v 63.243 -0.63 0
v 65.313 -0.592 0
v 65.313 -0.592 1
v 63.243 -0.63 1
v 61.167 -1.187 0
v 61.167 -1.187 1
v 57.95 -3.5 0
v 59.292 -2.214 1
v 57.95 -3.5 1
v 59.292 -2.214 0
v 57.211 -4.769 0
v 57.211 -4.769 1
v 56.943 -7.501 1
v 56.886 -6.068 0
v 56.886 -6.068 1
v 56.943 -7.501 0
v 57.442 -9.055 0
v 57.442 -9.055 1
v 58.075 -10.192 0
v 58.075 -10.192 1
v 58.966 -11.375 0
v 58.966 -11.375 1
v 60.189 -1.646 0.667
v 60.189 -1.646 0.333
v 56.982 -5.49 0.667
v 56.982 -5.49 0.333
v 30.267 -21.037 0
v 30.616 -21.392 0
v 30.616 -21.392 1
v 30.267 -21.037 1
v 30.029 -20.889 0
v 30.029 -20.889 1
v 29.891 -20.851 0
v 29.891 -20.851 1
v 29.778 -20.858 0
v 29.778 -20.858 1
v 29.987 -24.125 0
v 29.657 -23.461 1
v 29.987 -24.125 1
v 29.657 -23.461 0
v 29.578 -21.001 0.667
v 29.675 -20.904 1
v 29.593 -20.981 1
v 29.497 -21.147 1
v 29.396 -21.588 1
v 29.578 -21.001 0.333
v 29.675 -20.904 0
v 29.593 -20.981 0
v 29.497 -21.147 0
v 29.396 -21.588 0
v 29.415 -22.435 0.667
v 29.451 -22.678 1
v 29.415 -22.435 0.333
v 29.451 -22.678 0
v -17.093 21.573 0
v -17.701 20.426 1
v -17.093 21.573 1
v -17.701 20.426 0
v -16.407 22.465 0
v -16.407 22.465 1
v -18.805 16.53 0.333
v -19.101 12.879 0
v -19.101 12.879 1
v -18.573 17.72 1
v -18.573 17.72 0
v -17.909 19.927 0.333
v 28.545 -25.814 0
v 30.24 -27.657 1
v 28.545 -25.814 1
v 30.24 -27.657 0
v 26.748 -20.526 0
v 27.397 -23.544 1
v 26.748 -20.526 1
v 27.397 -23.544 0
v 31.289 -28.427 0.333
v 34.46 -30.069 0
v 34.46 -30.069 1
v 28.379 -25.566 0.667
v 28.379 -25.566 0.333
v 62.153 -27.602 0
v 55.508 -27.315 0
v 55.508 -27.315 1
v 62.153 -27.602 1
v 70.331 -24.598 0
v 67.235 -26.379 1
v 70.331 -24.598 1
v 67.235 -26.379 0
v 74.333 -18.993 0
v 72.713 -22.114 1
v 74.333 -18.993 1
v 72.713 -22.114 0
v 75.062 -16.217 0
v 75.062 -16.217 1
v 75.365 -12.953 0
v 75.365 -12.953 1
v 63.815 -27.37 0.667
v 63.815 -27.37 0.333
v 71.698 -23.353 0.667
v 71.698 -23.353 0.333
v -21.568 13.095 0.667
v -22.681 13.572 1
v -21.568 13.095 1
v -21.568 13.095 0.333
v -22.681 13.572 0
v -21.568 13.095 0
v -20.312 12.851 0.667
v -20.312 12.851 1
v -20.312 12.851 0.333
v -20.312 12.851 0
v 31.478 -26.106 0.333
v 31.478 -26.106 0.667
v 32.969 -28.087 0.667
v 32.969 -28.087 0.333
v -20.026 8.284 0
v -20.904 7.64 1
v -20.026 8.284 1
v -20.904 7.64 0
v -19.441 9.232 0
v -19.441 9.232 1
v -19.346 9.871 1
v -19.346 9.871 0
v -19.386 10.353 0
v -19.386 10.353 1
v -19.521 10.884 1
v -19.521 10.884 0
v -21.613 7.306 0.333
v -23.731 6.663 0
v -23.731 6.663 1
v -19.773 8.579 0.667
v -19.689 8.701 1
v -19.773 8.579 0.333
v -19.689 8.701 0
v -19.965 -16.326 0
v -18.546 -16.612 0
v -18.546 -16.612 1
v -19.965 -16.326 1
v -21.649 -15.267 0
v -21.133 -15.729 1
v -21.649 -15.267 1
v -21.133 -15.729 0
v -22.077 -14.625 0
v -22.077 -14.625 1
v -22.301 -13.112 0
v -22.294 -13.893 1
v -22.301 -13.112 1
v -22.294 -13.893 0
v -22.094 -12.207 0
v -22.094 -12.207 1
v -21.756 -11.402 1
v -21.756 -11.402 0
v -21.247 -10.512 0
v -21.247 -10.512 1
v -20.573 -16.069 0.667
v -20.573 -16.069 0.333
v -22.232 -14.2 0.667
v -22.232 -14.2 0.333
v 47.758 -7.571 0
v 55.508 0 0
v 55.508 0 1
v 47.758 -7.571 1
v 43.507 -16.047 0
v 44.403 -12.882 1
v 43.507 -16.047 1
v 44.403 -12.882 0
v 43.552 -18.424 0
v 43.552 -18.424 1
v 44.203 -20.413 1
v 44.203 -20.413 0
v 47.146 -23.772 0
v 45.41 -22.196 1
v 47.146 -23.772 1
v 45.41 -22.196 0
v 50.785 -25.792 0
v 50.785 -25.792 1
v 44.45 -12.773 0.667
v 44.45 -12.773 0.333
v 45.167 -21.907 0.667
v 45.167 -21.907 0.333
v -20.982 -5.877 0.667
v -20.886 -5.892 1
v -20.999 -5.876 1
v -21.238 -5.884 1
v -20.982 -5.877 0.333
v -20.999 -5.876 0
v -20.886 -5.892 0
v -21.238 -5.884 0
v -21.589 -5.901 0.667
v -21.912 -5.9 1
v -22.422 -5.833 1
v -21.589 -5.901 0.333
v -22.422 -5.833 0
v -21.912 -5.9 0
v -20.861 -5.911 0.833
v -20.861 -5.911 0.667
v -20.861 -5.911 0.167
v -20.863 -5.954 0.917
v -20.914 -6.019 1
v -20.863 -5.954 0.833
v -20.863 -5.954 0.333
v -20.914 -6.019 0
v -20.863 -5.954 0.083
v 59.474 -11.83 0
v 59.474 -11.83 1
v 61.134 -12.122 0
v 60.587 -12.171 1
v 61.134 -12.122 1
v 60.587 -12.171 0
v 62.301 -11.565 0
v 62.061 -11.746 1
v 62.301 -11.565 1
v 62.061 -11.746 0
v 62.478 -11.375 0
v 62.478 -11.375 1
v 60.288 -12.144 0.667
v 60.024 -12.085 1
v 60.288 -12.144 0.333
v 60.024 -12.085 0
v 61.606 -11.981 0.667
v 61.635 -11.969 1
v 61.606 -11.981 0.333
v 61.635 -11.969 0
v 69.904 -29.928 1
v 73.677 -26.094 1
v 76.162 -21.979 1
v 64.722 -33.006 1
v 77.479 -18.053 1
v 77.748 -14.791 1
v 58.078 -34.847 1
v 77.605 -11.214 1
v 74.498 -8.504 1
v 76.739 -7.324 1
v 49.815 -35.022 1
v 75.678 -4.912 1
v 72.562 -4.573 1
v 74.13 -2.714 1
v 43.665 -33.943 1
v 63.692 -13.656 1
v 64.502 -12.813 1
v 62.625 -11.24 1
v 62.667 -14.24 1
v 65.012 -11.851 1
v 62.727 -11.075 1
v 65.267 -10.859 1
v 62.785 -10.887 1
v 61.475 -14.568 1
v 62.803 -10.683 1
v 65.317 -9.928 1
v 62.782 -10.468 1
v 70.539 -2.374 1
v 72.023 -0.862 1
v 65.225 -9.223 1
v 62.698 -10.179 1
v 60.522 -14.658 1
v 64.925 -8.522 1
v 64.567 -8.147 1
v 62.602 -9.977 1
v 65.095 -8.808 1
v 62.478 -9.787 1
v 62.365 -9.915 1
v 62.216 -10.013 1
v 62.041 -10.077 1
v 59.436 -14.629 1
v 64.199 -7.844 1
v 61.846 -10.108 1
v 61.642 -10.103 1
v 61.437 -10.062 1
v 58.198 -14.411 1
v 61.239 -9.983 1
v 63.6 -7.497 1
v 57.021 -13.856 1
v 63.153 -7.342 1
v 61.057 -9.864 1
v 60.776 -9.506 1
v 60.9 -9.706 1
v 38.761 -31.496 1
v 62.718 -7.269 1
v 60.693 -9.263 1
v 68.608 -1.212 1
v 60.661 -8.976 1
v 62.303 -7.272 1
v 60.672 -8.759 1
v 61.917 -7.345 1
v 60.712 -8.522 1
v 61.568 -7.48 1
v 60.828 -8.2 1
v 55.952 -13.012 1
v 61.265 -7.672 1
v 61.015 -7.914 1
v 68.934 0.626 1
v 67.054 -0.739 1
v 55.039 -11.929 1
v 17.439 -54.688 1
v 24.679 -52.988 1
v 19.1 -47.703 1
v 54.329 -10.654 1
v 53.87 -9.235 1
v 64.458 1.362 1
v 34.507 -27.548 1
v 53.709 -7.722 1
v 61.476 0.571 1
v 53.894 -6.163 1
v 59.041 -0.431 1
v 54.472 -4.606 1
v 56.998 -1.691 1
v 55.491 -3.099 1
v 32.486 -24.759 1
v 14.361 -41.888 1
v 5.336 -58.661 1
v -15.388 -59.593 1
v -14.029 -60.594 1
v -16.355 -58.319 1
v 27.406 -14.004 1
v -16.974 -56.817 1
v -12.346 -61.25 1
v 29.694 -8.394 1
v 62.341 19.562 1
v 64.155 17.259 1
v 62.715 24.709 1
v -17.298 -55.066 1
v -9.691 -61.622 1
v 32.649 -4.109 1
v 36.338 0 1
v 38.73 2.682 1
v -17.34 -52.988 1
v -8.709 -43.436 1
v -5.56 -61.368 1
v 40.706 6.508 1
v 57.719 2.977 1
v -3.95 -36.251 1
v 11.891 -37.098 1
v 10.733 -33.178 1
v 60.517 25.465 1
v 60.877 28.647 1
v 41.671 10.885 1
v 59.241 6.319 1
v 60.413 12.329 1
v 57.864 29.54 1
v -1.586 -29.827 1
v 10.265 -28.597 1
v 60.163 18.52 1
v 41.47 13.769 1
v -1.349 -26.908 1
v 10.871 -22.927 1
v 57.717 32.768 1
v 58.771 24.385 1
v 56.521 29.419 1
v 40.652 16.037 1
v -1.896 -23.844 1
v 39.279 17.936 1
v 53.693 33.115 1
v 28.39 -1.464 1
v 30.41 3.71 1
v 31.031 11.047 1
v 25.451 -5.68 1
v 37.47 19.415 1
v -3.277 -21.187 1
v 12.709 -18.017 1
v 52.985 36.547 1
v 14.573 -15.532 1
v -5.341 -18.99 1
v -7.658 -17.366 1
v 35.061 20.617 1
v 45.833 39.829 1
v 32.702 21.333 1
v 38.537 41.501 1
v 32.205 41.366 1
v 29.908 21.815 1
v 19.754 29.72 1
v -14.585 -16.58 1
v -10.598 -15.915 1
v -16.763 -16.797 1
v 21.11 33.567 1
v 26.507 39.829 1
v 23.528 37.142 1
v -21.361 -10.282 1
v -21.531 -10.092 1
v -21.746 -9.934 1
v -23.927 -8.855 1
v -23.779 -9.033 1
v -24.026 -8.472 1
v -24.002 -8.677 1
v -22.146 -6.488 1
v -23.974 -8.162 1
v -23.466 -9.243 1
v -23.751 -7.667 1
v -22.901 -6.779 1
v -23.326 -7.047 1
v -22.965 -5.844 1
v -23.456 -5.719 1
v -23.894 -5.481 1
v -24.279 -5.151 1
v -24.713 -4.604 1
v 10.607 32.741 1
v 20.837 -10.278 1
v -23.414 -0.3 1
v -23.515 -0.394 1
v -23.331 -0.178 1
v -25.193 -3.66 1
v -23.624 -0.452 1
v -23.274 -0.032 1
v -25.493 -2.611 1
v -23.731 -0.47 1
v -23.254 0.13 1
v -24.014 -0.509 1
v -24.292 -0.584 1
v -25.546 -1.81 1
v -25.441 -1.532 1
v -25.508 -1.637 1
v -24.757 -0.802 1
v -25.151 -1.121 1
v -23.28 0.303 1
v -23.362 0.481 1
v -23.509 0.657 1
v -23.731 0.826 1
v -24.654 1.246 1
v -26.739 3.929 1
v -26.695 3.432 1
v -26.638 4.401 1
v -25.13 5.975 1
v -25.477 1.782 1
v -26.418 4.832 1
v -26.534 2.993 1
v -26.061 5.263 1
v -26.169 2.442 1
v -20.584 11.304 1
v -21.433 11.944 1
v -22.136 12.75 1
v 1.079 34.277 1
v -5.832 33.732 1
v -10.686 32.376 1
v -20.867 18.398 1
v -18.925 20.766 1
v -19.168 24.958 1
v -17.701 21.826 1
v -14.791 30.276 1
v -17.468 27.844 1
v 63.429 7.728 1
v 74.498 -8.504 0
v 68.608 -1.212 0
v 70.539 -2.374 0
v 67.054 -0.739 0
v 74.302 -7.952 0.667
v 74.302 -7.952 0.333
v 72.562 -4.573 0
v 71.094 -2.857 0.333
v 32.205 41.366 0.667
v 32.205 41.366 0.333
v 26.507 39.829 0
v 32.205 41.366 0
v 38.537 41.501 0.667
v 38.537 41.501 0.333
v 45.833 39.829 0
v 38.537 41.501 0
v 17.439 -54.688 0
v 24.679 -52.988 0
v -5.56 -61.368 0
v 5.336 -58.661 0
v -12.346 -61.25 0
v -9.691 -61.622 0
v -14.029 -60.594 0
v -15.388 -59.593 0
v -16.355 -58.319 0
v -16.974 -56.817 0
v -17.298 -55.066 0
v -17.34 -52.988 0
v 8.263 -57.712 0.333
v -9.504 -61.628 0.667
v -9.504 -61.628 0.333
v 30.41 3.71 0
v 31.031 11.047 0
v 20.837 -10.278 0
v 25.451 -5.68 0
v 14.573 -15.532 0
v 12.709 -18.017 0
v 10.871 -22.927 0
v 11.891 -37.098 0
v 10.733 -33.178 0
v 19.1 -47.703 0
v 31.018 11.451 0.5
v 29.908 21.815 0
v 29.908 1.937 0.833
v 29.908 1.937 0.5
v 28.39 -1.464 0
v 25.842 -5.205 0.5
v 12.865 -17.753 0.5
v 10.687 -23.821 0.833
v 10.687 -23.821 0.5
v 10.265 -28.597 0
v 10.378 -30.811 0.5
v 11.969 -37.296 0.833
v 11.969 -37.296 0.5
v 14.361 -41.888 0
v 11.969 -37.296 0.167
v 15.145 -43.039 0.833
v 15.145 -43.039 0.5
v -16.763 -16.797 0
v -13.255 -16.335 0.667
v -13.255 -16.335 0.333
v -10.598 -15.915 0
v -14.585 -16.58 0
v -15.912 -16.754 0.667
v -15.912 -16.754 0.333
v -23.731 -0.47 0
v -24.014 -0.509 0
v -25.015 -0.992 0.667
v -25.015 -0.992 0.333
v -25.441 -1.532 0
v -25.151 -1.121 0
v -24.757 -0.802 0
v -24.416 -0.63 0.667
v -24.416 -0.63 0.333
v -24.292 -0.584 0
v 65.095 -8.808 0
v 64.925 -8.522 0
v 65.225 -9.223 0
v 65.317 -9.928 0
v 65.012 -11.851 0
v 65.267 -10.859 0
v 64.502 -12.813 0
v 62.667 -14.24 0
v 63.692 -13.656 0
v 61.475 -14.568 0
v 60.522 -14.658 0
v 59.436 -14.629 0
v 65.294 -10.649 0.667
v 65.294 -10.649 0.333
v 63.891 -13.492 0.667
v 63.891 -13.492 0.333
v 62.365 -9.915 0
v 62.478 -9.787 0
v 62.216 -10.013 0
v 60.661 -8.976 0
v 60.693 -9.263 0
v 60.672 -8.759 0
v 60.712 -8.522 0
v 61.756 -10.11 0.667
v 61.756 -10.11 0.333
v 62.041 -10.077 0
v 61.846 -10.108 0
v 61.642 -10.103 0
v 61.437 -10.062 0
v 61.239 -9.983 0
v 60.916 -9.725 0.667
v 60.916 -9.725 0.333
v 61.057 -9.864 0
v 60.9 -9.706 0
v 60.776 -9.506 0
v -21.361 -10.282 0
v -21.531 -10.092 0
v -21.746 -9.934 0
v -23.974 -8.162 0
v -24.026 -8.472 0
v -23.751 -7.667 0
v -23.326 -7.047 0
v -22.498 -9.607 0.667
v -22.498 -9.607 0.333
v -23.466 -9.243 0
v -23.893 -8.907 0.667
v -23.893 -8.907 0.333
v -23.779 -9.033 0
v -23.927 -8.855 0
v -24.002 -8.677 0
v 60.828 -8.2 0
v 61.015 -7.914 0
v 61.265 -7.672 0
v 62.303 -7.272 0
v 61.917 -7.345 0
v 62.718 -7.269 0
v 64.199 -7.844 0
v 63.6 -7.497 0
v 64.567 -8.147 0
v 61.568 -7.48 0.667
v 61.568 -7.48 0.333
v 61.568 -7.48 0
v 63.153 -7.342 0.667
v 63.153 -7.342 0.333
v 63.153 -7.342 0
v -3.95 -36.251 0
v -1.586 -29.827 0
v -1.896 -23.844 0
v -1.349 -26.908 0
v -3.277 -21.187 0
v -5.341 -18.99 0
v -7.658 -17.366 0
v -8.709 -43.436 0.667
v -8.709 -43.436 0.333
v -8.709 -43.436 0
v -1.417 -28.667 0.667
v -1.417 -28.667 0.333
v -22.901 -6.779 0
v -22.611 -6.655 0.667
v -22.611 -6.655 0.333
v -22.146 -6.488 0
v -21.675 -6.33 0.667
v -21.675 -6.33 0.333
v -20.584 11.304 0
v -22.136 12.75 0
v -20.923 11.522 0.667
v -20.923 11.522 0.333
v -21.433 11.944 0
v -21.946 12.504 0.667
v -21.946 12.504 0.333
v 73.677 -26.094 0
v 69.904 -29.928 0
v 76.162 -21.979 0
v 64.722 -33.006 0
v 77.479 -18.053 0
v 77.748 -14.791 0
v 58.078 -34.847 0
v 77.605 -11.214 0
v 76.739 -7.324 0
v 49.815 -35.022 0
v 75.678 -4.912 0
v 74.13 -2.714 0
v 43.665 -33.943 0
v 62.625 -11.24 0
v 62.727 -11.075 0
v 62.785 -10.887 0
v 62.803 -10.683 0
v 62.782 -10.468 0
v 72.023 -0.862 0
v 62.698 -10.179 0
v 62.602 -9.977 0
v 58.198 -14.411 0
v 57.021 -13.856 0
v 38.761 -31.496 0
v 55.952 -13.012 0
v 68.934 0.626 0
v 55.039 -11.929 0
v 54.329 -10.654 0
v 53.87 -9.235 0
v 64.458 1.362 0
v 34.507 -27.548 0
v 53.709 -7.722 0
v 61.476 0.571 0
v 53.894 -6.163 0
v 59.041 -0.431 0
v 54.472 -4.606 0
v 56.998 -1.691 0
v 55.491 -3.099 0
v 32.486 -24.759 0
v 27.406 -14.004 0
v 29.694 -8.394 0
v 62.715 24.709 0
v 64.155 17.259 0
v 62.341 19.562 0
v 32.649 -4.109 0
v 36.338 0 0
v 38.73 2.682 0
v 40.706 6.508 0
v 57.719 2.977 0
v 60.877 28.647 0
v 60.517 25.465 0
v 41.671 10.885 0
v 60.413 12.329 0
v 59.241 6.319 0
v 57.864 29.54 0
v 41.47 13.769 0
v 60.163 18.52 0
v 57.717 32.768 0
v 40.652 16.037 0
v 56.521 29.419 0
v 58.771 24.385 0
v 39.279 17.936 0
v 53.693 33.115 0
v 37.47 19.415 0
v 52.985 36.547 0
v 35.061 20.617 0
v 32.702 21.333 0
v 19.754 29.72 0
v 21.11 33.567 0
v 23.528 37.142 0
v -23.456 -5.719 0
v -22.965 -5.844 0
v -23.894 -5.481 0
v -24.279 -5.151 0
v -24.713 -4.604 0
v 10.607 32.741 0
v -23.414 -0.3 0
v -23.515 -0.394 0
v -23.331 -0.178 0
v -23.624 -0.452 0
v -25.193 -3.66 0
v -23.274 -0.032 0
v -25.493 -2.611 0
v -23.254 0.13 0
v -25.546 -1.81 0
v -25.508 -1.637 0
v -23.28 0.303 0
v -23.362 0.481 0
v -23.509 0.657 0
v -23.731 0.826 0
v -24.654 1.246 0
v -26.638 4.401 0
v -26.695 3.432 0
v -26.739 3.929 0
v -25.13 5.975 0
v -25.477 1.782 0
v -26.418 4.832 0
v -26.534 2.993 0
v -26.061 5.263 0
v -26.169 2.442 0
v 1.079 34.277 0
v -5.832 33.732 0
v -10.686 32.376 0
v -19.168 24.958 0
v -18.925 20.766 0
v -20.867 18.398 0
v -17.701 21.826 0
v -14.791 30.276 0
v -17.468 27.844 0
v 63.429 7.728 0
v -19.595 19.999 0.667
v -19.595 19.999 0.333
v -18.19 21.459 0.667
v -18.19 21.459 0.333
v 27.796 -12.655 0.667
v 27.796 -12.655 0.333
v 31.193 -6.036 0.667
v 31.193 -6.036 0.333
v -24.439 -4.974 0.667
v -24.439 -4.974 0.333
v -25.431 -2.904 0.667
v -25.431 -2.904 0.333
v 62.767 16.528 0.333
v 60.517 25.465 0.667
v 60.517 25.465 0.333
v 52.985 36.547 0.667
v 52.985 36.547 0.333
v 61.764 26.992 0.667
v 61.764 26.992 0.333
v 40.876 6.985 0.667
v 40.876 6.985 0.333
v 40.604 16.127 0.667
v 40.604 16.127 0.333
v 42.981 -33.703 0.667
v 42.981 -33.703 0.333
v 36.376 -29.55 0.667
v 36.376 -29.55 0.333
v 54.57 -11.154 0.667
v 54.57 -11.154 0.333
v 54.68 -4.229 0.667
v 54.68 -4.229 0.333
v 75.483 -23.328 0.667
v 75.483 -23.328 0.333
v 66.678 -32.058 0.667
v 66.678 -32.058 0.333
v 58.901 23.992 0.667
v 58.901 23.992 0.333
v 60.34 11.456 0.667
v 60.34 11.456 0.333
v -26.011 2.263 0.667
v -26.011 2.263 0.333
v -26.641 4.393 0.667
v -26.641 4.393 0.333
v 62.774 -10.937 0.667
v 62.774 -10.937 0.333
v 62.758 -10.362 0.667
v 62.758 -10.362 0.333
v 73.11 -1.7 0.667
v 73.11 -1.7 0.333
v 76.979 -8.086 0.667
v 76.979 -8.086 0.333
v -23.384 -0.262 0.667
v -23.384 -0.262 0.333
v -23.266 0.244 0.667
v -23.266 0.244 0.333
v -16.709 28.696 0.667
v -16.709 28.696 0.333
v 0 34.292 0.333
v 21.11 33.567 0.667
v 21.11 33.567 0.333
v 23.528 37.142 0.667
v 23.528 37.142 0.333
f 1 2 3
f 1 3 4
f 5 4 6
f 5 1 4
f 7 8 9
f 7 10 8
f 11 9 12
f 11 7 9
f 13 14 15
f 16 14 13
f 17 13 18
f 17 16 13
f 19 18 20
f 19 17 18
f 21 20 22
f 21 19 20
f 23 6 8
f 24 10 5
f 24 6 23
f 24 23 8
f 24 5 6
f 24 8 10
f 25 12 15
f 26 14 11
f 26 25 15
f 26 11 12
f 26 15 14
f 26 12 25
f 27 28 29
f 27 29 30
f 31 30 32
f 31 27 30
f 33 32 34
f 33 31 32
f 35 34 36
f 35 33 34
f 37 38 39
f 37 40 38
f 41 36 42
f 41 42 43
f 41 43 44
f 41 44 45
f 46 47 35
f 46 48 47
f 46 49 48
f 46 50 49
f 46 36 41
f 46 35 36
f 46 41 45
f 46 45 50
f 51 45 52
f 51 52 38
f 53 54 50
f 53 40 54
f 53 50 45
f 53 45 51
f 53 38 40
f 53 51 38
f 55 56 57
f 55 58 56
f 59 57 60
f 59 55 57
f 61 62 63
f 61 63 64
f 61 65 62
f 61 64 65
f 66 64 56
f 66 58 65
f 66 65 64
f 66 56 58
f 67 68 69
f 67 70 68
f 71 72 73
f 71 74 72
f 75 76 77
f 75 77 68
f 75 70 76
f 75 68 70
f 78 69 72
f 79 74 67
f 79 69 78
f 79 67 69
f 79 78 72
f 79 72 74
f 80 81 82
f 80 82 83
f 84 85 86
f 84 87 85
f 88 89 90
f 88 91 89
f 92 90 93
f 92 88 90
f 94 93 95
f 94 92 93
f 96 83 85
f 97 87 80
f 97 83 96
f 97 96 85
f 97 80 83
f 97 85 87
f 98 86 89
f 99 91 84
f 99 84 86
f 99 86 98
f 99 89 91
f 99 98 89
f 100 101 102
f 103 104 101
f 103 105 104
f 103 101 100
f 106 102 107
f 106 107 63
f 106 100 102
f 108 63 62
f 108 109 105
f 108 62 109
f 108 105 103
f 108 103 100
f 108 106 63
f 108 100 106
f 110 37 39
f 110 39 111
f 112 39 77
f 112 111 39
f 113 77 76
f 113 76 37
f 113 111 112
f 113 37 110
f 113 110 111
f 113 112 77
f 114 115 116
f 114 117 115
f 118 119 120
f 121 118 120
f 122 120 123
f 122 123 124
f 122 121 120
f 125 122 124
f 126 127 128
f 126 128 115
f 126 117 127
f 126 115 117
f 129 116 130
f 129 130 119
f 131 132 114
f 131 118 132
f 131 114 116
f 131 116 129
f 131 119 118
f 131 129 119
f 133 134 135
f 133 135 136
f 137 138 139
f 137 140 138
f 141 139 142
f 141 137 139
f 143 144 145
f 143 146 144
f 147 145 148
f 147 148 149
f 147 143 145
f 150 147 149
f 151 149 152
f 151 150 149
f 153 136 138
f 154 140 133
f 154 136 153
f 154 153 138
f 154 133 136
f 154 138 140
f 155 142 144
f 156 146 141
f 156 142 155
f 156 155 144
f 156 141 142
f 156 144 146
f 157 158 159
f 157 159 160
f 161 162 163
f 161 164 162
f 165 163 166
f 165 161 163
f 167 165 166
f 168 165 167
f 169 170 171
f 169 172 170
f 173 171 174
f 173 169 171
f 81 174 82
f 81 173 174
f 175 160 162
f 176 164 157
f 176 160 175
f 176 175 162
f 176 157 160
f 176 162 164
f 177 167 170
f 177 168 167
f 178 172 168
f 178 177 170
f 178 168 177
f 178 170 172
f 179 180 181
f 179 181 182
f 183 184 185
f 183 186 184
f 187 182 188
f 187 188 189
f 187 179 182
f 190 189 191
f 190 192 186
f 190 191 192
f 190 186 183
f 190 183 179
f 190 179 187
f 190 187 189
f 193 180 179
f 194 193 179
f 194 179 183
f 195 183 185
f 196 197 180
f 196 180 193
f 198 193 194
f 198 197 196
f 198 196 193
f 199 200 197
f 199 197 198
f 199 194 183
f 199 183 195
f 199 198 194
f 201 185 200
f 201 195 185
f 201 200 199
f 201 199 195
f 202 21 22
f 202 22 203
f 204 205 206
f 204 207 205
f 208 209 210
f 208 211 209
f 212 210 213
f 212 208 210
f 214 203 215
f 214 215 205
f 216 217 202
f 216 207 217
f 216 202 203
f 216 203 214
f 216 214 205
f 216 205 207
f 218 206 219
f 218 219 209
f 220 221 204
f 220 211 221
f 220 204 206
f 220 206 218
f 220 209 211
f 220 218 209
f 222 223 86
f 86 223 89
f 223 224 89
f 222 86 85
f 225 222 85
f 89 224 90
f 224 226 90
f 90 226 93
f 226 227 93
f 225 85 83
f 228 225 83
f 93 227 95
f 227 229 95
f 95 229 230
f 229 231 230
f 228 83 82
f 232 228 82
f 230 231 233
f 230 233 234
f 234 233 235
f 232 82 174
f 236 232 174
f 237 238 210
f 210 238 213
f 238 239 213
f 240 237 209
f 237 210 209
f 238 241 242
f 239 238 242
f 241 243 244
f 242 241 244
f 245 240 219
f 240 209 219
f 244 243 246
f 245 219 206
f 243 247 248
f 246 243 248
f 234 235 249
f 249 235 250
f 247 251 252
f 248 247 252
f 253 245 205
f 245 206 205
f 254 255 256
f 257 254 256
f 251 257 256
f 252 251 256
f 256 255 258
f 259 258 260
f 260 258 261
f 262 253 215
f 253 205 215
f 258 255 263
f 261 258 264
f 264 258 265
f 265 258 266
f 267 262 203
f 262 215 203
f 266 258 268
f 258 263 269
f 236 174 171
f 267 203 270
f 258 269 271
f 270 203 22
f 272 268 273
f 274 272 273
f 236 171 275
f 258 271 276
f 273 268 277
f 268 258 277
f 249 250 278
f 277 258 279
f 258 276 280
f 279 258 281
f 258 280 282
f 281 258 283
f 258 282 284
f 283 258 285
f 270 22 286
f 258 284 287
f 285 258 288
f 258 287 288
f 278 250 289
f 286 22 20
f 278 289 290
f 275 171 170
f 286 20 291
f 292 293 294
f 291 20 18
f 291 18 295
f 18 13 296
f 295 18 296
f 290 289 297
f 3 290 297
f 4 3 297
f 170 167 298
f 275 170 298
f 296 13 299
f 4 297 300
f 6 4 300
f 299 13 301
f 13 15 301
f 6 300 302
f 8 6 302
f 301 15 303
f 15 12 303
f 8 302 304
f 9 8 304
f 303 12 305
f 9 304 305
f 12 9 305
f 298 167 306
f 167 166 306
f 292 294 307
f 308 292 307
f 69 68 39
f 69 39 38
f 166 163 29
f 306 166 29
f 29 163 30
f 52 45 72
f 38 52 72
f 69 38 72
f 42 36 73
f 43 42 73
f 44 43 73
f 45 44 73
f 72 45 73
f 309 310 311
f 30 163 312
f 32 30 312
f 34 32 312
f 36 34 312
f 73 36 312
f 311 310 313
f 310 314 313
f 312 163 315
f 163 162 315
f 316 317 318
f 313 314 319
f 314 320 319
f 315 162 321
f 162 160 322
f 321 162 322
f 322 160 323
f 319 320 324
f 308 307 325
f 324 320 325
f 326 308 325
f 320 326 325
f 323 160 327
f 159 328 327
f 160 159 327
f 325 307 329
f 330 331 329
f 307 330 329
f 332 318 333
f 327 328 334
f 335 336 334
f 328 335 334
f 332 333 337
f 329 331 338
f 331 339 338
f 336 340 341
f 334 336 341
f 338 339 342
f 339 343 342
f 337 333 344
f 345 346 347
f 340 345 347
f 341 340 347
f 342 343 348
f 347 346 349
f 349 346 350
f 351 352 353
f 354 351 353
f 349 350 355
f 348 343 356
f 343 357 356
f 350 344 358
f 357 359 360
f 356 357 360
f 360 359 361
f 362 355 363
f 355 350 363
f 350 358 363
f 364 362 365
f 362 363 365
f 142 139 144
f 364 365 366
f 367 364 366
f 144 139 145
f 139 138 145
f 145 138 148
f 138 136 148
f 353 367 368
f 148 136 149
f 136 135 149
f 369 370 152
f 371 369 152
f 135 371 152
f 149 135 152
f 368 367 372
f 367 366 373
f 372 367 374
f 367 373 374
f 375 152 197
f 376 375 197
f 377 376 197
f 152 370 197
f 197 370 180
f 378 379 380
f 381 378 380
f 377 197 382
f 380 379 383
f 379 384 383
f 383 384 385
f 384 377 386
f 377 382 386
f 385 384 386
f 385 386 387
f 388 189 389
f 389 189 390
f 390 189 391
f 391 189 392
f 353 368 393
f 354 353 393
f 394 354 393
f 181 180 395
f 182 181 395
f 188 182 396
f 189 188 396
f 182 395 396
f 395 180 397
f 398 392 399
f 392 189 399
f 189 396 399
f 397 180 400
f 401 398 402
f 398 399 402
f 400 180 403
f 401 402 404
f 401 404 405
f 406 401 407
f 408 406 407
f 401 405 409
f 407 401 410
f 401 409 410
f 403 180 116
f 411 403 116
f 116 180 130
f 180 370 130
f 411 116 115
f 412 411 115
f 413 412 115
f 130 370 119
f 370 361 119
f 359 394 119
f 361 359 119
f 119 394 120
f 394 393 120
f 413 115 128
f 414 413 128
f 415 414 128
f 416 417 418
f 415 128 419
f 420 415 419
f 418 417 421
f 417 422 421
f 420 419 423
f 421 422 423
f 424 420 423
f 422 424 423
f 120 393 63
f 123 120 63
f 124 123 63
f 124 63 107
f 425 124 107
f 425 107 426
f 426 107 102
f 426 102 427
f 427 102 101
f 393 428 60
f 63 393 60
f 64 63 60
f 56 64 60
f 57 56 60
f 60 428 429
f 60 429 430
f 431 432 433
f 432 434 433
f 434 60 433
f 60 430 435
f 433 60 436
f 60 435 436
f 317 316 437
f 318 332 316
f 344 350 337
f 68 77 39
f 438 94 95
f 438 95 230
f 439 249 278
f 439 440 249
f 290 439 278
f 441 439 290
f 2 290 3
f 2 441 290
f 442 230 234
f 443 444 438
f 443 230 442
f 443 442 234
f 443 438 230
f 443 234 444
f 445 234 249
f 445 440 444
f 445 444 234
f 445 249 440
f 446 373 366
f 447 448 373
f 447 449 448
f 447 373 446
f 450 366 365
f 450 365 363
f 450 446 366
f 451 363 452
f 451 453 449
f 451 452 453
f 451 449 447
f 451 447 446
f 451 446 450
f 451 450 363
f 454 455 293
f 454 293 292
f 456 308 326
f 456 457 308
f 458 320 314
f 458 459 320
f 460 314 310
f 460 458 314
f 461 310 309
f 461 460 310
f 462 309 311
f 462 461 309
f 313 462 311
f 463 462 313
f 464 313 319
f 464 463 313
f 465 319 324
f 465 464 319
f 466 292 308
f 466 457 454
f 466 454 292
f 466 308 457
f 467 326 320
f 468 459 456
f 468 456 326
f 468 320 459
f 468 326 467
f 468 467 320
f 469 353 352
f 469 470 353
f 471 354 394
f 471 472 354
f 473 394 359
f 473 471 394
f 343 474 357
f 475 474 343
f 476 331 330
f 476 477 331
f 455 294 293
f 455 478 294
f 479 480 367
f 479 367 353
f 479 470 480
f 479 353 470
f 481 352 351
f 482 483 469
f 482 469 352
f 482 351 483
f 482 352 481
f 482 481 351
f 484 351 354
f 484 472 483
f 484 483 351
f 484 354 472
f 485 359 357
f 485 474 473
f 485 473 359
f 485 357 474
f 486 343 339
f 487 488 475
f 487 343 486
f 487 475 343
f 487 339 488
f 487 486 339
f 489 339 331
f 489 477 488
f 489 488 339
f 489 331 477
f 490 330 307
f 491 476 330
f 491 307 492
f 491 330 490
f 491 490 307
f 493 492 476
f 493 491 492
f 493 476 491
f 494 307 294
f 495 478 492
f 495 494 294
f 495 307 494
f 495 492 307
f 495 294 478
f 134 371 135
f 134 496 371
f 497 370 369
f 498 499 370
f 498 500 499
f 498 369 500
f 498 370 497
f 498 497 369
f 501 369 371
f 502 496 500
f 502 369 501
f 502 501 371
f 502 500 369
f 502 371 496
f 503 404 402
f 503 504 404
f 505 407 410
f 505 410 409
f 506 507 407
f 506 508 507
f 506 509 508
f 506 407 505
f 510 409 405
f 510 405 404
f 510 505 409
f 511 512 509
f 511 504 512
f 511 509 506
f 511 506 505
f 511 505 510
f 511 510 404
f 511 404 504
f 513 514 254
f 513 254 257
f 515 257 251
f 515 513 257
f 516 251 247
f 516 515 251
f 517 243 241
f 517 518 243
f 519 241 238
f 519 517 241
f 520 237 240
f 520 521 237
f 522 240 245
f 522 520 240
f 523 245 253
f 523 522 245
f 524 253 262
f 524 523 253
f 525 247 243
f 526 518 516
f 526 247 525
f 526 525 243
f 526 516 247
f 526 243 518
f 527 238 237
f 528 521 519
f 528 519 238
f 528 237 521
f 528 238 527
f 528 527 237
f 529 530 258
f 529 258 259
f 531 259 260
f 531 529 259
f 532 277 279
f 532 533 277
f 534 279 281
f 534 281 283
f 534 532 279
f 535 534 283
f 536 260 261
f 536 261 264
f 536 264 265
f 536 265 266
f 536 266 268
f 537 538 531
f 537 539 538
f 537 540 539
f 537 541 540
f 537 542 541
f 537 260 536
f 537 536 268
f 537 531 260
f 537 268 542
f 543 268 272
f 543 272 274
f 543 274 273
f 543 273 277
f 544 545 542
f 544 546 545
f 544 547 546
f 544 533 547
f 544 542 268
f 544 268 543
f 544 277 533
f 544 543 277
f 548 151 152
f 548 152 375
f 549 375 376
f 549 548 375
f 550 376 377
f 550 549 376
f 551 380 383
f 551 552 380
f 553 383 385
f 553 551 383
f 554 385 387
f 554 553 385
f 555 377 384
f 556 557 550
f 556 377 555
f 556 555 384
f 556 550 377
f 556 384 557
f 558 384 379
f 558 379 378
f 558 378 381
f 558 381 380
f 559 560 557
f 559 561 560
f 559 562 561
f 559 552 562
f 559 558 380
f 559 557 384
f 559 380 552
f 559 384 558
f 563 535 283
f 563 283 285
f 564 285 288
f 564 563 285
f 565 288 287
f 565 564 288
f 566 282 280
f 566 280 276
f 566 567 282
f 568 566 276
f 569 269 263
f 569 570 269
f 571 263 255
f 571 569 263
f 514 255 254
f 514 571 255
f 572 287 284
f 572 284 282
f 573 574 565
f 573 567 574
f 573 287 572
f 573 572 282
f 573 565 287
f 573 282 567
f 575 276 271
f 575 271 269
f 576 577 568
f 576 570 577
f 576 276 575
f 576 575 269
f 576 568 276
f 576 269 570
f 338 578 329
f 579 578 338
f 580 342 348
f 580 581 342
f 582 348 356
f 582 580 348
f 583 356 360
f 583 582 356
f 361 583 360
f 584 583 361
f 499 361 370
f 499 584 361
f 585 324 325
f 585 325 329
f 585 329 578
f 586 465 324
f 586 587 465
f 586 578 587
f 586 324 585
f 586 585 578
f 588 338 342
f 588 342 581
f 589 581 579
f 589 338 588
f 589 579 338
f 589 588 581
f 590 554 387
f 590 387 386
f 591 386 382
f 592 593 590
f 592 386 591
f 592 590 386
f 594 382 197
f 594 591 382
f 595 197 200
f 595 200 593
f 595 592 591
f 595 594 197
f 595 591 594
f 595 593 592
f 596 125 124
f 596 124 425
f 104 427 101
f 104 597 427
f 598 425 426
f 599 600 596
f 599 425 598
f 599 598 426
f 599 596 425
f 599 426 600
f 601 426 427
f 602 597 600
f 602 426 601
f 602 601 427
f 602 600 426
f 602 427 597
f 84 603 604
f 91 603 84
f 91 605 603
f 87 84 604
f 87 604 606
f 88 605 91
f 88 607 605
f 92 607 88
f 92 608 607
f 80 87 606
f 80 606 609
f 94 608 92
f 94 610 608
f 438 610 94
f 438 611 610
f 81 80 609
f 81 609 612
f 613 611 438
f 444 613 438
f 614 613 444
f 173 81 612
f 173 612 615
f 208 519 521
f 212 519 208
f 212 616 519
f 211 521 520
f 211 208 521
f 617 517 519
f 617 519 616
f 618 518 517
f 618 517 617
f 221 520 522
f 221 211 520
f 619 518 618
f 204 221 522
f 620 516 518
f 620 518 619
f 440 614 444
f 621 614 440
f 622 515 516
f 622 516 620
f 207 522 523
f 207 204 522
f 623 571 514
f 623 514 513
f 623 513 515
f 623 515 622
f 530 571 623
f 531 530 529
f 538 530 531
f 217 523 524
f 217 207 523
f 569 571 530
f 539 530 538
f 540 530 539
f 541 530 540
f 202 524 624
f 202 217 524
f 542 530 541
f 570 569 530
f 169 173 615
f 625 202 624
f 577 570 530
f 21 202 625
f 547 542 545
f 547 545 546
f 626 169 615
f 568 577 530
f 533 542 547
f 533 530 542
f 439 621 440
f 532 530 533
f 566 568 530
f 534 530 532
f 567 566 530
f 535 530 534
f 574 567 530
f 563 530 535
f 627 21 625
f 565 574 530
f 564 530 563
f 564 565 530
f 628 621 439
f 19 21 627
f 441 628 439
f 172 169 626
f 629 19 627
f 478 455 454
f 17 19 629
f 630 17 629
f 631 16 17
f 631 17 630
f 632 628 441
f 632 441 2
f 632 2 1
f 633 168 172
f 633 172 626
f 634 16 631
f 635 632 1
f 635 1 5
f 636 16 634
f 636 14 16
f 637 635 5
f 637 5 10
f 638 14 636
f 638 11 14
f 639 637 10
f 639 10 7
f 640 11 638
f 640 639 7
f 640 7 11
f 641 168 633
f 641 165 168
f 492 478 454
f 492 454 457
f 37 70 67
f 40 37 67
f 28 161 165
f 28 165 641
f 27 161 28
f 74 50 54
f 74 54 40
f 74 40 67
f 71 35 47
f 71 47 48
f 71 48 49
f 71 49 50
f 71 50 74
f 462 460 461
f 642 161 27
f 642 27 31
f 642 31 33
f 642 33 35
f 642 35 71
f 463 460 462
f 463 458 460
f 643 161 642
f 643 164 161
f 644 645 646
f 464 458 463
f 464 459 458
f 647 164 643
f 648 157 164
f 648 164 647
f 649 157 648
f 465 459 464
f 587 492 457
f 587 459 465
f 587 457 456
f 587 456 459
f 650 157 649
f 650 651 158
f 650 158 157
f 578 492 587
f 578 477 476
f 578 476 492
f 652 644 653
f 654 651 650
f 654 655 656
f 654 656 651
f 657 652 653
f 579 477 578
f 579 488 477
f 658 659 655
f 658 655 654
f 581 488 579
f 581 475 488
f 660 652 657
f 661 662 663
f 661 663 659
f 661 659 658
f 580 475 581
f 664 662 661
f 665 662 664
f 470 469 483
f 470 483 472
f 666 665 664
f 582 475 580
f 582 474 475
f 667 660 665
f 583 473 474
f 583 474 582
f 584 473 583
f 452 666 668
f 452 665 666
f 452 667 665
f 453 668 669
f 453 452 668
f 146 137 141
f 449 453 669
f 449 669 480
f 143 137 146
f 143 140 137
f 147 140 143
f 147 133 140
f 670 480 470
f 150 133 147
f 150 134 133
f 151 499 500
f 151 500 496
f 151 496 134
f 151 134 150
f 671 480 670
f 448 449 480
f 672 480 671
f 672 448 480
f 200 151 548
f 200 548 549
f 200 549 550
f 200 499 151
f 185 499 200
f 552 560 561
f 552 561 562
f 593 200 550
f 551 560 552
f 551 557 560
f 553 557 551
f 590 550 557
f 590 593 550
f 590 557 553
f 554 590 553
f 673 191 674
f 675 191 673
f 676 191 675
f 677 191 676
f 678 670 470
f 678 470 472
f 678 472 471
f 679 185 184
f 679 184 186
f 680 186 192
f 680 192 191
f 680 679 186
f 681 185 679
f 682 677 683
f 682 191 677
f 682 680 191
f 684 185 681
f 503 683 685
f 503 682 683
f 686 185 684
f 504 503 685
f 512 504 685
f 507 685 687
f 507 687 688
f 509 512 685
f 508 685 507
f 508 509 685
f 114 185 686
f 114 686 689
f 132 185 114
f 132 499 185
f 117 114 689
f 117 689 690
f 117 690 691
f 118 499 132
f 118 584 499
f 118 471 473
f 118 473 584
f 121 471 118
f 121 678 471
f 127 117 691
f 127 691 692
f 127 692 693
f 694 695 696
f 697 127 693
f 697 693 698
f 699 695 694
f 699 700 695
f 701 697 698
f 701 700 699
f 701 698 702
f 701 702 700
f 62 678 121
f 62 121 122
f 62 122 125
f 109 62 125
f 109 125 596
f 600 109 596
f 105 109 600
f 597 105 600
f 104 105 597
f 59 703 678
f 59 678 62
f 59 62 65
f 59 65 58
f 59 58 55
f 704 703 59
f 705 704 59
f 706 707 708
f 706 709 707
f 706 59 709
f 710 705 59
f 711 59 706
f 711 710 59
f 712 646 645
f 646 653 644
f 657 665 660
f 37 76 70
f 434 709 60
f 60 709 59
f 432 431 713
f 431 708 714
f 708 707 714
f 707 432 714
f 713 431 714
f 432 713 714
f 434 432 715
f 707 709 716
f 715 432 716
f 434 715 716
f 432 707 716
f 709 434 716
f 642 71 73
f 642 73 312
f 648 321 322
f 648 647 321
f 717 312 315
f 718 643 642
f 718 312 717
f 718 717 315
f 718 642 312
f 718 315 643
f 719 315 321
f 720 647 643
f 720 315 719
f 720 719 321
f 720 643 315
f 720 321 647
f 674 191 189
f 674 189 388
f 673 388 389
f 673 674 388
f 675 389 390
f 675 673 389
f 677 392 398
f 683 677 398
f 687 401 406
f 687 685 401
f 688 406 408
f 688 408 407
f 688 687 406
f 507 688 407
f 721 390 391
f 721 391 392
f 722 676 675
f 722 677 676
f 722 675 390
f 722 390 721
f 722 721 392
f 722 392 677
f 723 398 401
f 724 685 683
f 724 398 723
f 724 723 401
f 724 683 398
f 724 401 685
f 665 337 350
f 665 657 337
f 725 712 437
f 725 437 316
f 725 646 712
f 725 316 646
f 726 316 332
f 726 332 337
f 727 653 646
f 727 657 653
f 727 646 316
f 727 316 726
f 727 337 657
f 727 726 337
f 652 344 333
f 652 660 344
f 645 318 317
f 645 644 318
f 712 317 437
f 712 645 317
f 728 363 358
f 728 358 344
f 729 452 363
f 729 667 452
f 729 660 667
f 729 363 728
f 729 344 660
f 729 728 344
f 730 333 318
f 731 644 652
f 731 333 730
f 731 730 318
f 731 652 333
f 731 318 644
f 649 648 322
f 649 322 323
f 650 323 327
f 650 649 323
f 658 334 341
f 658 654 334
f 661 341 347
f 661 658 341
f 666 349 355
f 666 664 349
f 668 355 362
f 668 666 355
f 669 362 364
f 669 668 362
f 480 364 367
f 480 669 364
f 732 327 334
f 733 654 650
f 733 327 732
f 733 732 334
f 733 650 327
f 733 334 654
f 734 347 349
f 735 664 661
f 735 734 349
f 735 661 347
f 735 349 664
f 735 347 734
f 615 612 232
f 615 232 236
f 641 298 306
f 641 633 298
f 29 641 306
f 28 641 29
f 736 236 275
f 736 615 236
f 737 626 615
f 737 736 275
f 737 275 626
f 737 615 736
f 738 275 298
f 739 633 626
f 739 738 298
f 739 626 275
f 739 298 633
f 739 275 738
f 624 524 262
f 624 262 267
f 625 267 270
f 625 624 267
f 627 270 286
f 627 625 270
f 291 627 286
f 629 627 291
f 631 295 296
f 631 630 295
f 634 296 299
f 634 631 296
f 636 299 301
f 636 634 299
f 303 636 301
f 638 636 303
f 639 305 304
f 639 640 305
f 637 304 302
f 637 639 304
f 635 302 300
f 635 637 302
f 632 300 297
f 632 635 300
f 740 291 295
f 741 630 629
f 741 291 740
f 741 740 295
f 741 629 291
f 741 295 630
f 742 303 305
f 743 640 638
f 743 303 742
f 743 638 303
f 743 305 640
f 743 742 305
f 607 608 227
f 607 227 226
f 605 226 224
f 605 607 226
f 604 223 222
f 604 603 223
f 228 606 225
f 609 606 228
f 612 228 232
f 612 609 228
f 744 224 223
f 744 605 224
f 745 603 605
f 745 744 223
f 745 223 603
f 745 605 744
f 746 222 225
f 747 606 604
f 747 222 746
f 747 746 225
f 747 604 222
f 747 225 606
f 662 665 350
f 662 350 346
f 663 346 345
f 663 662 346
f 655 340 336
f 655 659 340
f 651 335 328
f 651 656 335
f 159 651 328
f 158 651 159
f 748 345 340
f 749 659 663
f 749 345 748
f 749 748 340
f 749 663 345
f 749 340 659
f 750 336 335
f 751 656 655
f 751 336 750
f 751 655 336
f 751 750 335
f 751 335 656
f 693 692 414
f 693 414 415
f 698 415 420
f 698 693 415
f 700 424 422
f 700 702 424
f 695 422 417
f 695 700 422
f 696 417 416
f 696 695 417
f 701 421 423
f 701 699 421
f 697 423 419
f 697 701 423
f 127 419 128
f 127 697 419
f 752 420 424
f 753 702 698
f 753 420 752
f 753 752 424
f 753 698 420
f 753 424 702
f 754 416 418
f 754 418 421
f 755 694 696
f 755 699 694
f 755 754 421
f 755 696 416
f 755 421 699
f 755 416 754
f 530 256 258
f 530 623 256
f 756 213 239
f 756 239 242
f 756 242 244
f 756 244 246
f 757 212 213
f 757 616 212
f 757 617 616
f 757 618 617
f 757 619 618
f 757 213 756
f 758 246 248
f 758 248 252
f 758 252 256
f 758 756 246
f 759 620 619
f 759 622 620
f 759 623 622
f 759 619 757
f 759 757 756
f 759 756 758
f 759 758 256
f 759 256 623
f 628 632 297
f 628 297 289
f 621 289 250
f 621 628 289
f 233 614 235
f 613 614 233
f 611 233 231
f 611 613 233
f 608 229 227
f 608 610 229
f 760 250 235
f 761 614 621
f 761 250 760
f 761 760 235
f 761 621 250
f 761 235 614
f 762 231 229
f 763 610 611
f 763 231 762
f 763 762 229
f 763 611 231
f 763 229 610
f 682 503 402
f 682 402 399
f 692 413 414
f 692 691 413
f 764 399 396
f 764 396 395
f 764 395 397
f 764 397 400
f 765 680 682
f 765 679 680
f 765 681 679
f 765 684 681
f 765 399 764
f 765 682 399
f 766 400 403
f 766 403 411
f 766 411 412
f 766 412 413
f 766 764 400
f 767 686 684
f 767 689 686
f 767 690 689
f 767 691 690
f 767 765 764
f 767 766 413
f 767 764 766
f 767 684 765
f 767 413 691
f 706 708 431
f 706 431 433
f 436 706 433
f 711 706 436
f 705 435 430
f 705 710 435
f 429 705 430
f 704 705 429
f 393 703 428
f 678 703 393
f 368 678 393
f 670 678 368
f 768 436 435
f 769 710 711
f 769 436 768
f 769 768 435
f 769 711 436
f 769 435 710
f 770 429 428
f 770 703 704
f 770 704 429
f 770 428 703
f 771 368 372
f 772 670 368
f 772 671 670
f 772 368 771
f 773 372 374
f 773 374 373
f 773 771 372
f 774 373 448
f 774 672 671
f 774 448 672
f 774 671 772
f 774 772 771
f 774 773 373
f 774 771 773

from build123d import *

# Parameters (mm, degrees)
F1_DEPTH = 1


with BuildPart() as f1:
    # F0 (on Top) → F1 (new body)
    with BuildSketch(Plane.XY):
        with BuildLine():
            add(Edge.make_bspline(
                [(-20.8665426716, 18.397650235), (-20.1903553635, 22.148523992), (-18.5927961308, 30.6072682277), (0.8297736088, 36.4578977579), (13.424566628, 32.0204028302), (19.7537988424, 29.7199543566)],
                knots=[0, 0, 0, 0, 0.276946376, 0.6257935478, 1, 1, 1, 1], degree=3))
            add(Edge.make_bspline(
                [(-20.8665426716, 18.397650235), (-19.5796533177, 19.9643534919), (-18.4618644416, 21.7904262245), (-16.4070501924, 22.4652308971)],
                knots=[0, 0, 0, 0, 6.0359163029, 6.0359163029, 6.0359163029, 6.0359163029], degree=3))
            add(Edge.make_bspline(
                [(-19.1014725715, 12.8793083131), (-19.1014725715, 16.4545979351), (-18.215386197, 20.5580331385), (-16.4070501924, 22.4652308971)],
                knots=[0, 0, 0, 0, 9.957400451, 9.957400451, 9.957400451, 9.957400451], degree=3))
            add(Edge.make_bspline(
                [(-22.681472823, 13.5721871629), (-21.7005256563, 12.9922945052), (-20.227715373, 12.7012068406), (-19.1014725715, 12.8793083131)],
                knots=[0, 0, 0, 0, 3.6464342722, 3.6464342722, 3.6464342722, 3.6464342722], degree=3))
            add(Edge.make_bspline(
                [(-19.5205342025, 10.8836535364), (-21.142622456, 11.263910681), (-22.0586042851, 12.5462869182), (-22.681472823, 13.5721871629)],
                knots=[0, 0, 0, 0, 4.1496681824, 4.1496681824, 4.1496681824, 4.1496681824], degree=3))
            add(Edge.make_bspline(
                [(-23.7308889627, 6.6631692462), (-21.9120476395, 7.1236696094), (-18.5412317514, 7.9297339544), (-19.5205342025, 10.8836535364)],
                knots=[0, 0, 0, 0, 5.9615077667, 5.9615077667, 5.9615077667, 5.9615077667], degree=3))
            add(Edge.make_bspline(
                [(-23.7308889627, 0.8257346926), (-26.2068863958, 1.7335914308), (-29.0413927287, 4.5064790174), (-23.7308889627, 6.6631692462)],
                knots=[0, 0, 0, 0, 5.8374345535, 5.8374345535, 5.8374345535, 5.8374345535], degree=3))
            add(Edge.make_bspline(
                [(-23.7308889627, -0.4696604155), (-23.3873687685, -0.4872174759), (-22.8560995311, 0.2822079114), (-23.7308889627, 0.8257346926)],
                knots=[0, 0, 0, 0, 1.2953951082, 1.2953951082, 1.2953951082, 1.2953951082], degree=3))
            add(Edge.make_bspline(
                [(-25.4408102483, -1.531884307), (-25.1299161464, -0.9100947645), (-24.4304016232, -0.5214762059), (-23.7308889627, -0.4696604155)],
                knots=[0, 0, 0, 0, 2.0129953796, 2.0129953796, 2.0129953796, 2.0129953796], degree=3))
            add(Edge.make_bspline(
                [(-22.4216707264, -5.833170151), (-24.9668207233, -6.2141881861), (-25.9071532637, -1.9205028657), (-25.4408102483, -1.531884307)],
                knots=[0, 0, 0, 0, 5.2551178259, 5.2551178259, 5.2551178259, 5.2551178259], degree=3))
            add(Edge.make_bspline(
                [(-20.9138079784, -6.0188561941), (-20.6068530679, -5.7070334442), (-21.582293878, -6.0338505094), (-22.4216707264, -5.833170151)],
                knots=[0, 0, 0, 0, 1.5192528998, 1.5192528998, 1.5192528998, 1.5192528998], degree=3))
            add(Edge.make_bspline(
                [(-23.3263075352, -7.0466995183), (-22.853889813, -6.6050914991), (-21.4558626197, -6.3404192432), (-20.9138079784, -6.0188561941)],
                knots=[0, 0, 0, 0, 2.6223302634, 2.6223302634, 2.6223302634, 2.6223302634], degree=3))
            add(Edge.make_bspline(
                [(-21.2470069528, -10.5123631656), (-21.7241961509, -9.0493401513), (-25.5754273385, -9.9428268093), (-23.3263075352, -7.0466995183)],
                knots=[0, 0, 0, 0, 4.0415733852, 4.0415733852, 4.0415733852, 4.0415733852], degree=3))
            add(Edge.make_bspline(
                [(-18.5455586761, -16.6124049574), (-19.9988428503, -16.5669471025), (-24.3122242391, -15.2729321271), (-21.2470069528, -10.5123631656)],
                knots=[0, 0, 0, 0, 6.6714565616, 6.6714565616, 6.6714565616, 6.6714565616], degree=3))
            add(Edge.make_bspline(
                [(-10.5979545042, -15.9152131528), (-13.2471558948, -16.147610421), (-15.9312561154, -17.2224100679), (-18.5455586761, -16.6124049574)],
                knots=[0, 0, 0, 0, 7.9781256249, 7.9781256249, 7.9781256249, 7.9781256249], degree=3))
            add(Edge.make_bspline(
                [(-17.3396617174, -52.9880858958), (-13.085112907, -48.4555363655), (11.8656428531, -25.2468641847), (-10.5979545042, -15.9152131528)],
                knots=[0, 0, 0, 0, 37.6808772399, 37.6808772399, 37.6808772399, 37.6808772399], degree=3))
            add(Edge.make_bspline(
                [(24.6794633567, -52.9880858958), (12.7007942647, -54.1992671788), (-18.2323064655, -71.822501719), (-17.3396617174, -52.9880858958)],
                knots=[0, 0, 0, 0, 42.0191250741, 42.0191250741, 42.0191250741, 42.0191250741], degree=3))
            add(Edge.make_bspline(
                [(29.9084167928, 21.8148902059), (30.8950484785, 14.8113194584), (32.7630662271, 1.551260361), (20.7029575849, -11.1408703973), (11.5996920553, -16.6471227563), (9.0480540501, -31.2728844387), (14.3939009926, -43.6415991523), (21.2232429507, -49.8474196819), (24.6794633567, -52.9880858958)],
                knots=[0, 0, 0, 0, 0.1970538936, 0.3730877246, 0.5146793148, 0.6758169533, 0.8359361607, 1, 1, 1, 1], degree=3))
            add(Edge.make_bspline(
                [(36.3382212818, 0), (41.4113514125, 4.037628416), (47.6856790483, 19.7234489024), (29.9084167928, 21.8148902059)],
                knots=[0, 0, 0, 0, 22.7427311566, 22.7427311566, 22.7427311566, 22.7427311566], degree=3))
            add(Edge.make_bspline(
                [(26.7475955188, -20.5264855176), (26.4226775616, -11.8059907109), (30.5184200406, -5.9673800133), (36.3382212818, 0)],
                knots=[0, 0, 0, 0, 22.6564937762, 22.6564937762, 22.6564937762, 22.6564937762], degree=3))
            add(Edge.make_bspline(
                [(34.4597883523, -30.0686936826), (31.496912241, -28.7179704756), (27.4011716247, -26.97510086), (26.7475955188, -20.5264855176)],
                knots=[0, 0, 0, 0, 12.2691342385, 12.2691342385, 12.2691342385, 12.2691342385], degree=3))
            add(Edge.make_bspline(
                [(29.987193644, -24.1249073297), (31.4780585468, -26.1061694473), (32.9689234495, -28.0874315649), (34.4597883523, -30.0686936826)],
                knots=[0, 0, 0, 0, 7.4385952728, 7.4385952728, 7.4385952728, 7.4385952728], degree=3))
            add(Edge.make_bspline(
                [(30.6163486093, -21.3921349496), (29.0937069803, -19.5650476962), (29.0937069803, -22.8308942169), (29.987193644, -24.1249073297)],
                knots=[0, 0, 0, 0, 2.8042611954, 2.8042611954, 2.8042611954, 2.8042611954], degree=3))
            add(Edge.make_bspline(
                [(49.8153455555, -35.02195701), (43.0737137794, -34.7288399935), (35.7458516955, -31.9442562759), (30.6163486093, -21.3921349496)],
                knots=[0, 0, 0, 0, 23.545138206, 23.545138206, 23.545138206, 23.545138206], degree=3))
            add(Edge.make_bspline(
                [(77.7483582497, -14.7911049426), (78.2474428415, -21.2455783039), (71.2127014995, -36.9272008538), (49.8153455555, -35.02195701)],
                knots=[0, 0, 0, 0, 34.4897169247, 34.4897169247, 34.4897169247, 34.4897169247], degree=3))
            add(Edge.make_bspline(
                [(64.4583404064, 1.3616352808), (76.0629549623, 0.9637963958), (77.9681950808, -8.9288158342), (77.7483582497, -14.7911049426)],
                knots=[0, 0, 0, 0, 20.9173514336, 20.9173514336, 20.9173514336, 20.9173514336], degree=3))
            add(Edge.make_bspline(
                [(59.4363287091, -14.6286822855), (53.6440759897, -14.4746331498), (48.2831597328, -1.9658291712), (64.4583404064, 1.3616352808)],
                knots=[0, 0, 0, 0, 16.7603955013, 16.7603955013, 16.7603955013, 16.7603955013], degree=3))
            add(Edge.make_bspline(
                [(64.9254620075, -8.5224593058), (65.7523497939, -9.4834351912), (65.8447816968, -15.1524497196), (59.4363287091, -14.6286822855)],
                knots=[0, 0, 0, 0, 8.2107577875, 8.2107577875, 8.2107577875, 8.2107577875], degree=3))
            add(Edge.make_bspline(
                [(60.7119426131, -8.5224593058), (61.0233768821, -7.1668047458), (63.2400512695, -6.5439366736), (64.9254620075, -8.5224593058)],
                knots=[0, 0, 0, 0, 4.2135193944, 4.2135193944, 4.2135193944, 4.2135193944], degree=3))
            add(Edge.make_bspline(
                [(62.4780319631, -9.7865154967), (62.0675943792, -10.4277031496), (60.3455491364, -10.1712280884), (60.7119426131, -8.5224593058)],
                knots=[0, 0, 0, 0, 2.1718447564, 2.1718447564, 2.1718447564, 2.1718447564], degree=3))
            add(Edge.make_bspline(
                [(62.4780319631, -11.3753341138), (62.9469379783, -11.0505707562), (62.8736615181, -10.3177847341), (62.4780319631, -9.7865154967)],
                knots=[0, 0, 0, 0, 1.5888186172, 1.5888186172, 1.5888186172, 1.5888186172], degree=3))
            add(Edge.make_bspline(
                [(58.9657090604, -11.3753341138), (60.144033283, -12.772618793), (61.9759969413, -12.0398327708), (62.4780319631, -11.3753341138)],
                knots=[0, 0, 0, 0, 3.5123229027, 3.5123229027, 3.5123229027, 3.5123229027], degree=3))
            add(Edge.make_bspline(
                [(65.3125420213, -0.5918830284), (60.3213422, 0), (53.2966963947, -4.7204042785), (58.9657090604, -11.3753341138)],
                knots=[0, 0, 0, 0, 12.5125978895, 12.5125978895, 12.5125978895, 12.5125978895], degree=3))
            add(Edge.make_bspline(
                [(75.3649771214, -12.9526508972), (75.2333179116, -8.9721651748), (72.5220516324, -0.4686435277), (65.3125420213, -0.5918830284)],
                knots=[0, 0, 0, 0, 15.9323580724, 15.9323580724, 15.9323580724, 15.9323580724], degree=3))
            add(Edge.make_bspline(
                [(55.5079430342, -27.3152571172), (62.761053443, -28.6342725158), (75.0718563795, -27.3152571172), (75.3649771214, -12.9526508972)],
                knots=[0, 0, 0, 0, 24.5068614916, 24.5068614916, 24.5068614916, 24.5068614916], degree=3))
            add(Edge.make_bspline(
                [(55.5079430342, 0), (37.8463231027, -14.5647795871), (41.0705842078, -23.7978845835), (55.5079430342, -27.3152571172)],
                knots=[0, 0, 0, 0, 27.3152571172, 27.3152571172, 27.3152571172, 27.3152571172], degree=3))
            add(Edge.make_bspline(
                [(53.6933578551, 33.1152714789), (59.9522590637, 27.195526287), (64.3094331026, 9.4182631001), (55.5079430342, 0)],
                knots=[0, 0, 0, 0, 33.1649502411, 33.1649502411, 33.1649502411, 33.1649502411], degree=3))
            add(Edge.make_bspline(
                [(63.429273665, 7.7279442921), (62.56660074, 15.9849859774), (63.7989938259, 26.5835784376), (53.6933578551, 33.1152714789)],
                knots=[0, 0, 0, 0, 27.1901533343, 27.1901533343, 27.1901533343, 27.1901533343], degree=3))
            add(Edge.make_bspline(
                [(45.8327420056, 39.828594774), (49.2567382753, 38.5378040373), (68.2356134057, 32.9920314252), (63.429273665, 7.7279442921)],
                knots=[0, 0, 0, 0, 36.6072354569, 36.6072354569, 36.6072354569, 36.6072354569], degree=3))
            add(Edge.make_bspline(
                [(26.5074167401, 39.828594774), (31.9970119745, 41.9316887856), (37.9454195499, 42.5398573279), (45.8327420056, 39.828594774)],
                knots=[0, 0, 0, 0, 19.3253252655, 19.3253252655, 19.3253252655, 19.3253252655], degree=3))
            add(Edge.make_bspline(
                [(19.7537988424, 29.7199543566), (20.4133884295, 33.497739788), (23.4133824706, 37.7923734486), (26.5074167401, 39.828594774)],
                knots=[0, 0, 0, 0, 12.1571364143, 12.1571364143, 12.1571364143, 12.1571364143], degree=3))
        make_face()
    extrude(amount=F1_DEPTH)


solid = f1.part
